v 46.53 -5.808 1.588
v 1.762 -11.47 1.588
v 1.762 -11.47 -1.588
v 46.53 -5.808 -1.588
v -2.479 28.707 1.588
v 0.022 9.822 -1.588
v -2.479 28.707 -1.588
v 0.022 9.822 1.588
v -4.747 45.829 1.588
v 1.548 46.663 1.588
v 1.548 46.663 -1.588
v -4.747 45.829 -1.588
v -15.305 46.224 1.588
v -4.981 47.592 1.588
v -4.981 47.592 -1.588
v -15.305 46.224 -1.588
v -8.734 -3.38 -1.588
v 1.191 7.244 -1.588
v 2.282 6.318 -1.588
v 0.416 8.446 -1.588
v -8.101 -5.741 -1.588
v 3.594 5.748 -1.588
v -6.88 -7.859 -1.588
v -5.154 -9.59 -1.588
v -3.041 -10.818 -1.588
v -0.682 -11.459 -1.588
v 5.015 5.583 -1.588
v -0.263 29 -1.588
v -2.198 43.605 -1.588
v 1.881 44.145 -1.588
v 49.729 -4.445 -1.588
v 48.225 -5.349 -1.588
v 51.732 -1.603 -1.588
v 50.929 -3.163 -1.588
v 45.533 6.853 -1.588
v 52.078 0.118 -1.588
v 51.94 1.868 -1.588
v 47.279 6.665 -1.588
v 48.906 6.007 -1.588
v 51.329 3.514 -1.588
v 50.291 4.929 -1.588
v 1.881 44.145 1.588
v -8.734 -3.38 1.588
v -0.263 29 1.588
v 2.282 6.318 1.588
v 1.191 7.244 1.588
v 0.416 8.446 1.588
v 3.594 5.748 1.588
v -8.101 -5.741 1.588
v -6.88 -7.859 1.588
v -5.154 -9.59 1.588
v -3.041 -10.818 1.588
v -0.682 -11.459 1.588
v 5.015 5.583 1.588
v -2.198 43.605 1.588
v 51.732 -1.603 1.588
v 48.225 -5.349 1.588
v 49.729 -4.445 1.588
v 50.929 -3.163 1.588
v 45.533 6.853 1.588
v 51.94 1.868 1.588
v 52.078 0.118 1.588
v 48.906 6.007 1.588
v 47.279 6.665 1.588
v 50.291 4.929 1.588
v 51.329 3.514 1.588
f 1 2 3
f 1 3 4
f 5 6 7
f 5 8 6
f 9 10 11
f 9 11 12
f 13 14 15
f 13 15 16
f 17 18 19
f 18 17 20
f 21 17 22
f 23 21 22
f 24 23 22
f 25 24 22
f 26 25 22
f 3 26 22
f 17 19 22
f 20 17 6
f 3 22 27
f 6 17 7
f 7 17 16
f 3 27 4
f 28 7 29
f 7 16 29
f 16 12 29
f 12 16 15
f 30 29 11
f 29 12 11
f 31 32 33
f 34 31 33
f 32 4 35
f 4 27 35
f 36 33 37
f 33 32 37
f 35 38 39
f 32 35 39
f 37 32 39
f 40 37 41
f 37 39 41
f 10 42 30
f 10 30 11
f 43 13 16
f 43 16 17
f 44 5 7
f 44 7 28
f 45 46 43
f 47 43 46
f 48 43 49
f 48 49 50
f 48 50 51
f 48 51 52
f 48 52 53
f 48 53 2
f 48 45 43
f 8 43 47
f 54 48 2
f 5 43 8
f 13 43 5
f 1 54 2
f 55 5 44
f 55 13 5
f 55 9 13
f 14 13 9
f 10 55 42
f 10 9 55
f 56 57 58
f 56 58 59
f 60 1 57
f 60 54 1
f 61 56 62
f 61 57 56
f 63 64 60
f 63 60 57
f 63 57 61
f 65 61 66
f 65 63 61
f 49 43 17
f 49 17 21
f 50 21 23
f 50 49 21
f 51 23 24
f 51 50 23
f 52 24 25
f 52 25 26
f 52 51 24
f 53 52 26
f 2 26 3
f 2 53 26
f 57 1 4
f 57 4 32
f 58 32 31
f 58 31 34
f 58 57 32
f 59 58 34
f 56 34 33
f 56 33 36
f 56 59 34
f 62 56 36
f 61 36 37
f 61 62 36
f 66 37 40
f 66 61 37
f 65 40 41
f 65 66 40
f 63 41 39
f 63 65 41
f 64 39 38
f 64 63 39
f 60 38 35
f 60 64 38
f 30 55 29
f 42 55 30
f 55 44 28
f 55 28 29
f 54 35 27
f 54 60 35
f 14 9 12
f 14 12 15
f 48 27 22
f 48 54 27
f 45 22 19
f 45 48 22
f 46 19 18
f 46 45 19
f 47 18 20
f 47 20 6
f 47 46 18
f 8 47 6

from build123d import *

# Parameters (mm, degrees)
BOSS_EXTRUDE1_DEPTH = 1.5875


with BuildPart() as part:
    # Sketch2 → Boss-Extrude1 (new, symmetric)
    with BuildSketch(Plane.XY):
        with BuildLine():
            Line((0.022257802, 9.82186659), (-2.479270797, 28.706909737))
            Line((-2.479270797, 28.706909737), (-0.263425734, 29.000422426))
            Line((-0.263425734, 29.000422426), (-2.197941184, 43.604855793))
            Line((-2.197941184, 43.604855793), (1.881228135, 44.14518597))
            Line((1.881228135, 44.14518597), (1.547690989, 46.663191723))
            Line((1.547690989, 46.663191723), (-4.747323394, 45.829348857))
            Line((-4.747323394, 45.829348857), (-4.980799396, 47.591952884))
            Line((-4.980799396, 47.591952884), (-15.304622983, 46.224450583))
            Line((-15.304622983, 46.224450583), (-8.733941196, -3.38026275))
            ThreePointArc((-8.733941196, -3.38026275), (-5.154398694, -9.589912307), (1.762103428, -11.470037447))
            Line((1.762103428, -11.470037447), (46.530195884, -5.807878402))
            ThreePointArc((46.530195884, -5.807878402), (52.07, 0.997941592), (45.533364229, 6.85294016))
            Line((45.533364229, 6.85294016), (5.015377017, 5.582956452))
            ThreePointArc((5.015377017, 5.582956452), (1.702583701, 6.740949239), (0.022257802, 9.82186659))
        make_face()
    extrude(amount=BOSS_EXTRUDE1_DEPTH, both=True)


solid = part.part
